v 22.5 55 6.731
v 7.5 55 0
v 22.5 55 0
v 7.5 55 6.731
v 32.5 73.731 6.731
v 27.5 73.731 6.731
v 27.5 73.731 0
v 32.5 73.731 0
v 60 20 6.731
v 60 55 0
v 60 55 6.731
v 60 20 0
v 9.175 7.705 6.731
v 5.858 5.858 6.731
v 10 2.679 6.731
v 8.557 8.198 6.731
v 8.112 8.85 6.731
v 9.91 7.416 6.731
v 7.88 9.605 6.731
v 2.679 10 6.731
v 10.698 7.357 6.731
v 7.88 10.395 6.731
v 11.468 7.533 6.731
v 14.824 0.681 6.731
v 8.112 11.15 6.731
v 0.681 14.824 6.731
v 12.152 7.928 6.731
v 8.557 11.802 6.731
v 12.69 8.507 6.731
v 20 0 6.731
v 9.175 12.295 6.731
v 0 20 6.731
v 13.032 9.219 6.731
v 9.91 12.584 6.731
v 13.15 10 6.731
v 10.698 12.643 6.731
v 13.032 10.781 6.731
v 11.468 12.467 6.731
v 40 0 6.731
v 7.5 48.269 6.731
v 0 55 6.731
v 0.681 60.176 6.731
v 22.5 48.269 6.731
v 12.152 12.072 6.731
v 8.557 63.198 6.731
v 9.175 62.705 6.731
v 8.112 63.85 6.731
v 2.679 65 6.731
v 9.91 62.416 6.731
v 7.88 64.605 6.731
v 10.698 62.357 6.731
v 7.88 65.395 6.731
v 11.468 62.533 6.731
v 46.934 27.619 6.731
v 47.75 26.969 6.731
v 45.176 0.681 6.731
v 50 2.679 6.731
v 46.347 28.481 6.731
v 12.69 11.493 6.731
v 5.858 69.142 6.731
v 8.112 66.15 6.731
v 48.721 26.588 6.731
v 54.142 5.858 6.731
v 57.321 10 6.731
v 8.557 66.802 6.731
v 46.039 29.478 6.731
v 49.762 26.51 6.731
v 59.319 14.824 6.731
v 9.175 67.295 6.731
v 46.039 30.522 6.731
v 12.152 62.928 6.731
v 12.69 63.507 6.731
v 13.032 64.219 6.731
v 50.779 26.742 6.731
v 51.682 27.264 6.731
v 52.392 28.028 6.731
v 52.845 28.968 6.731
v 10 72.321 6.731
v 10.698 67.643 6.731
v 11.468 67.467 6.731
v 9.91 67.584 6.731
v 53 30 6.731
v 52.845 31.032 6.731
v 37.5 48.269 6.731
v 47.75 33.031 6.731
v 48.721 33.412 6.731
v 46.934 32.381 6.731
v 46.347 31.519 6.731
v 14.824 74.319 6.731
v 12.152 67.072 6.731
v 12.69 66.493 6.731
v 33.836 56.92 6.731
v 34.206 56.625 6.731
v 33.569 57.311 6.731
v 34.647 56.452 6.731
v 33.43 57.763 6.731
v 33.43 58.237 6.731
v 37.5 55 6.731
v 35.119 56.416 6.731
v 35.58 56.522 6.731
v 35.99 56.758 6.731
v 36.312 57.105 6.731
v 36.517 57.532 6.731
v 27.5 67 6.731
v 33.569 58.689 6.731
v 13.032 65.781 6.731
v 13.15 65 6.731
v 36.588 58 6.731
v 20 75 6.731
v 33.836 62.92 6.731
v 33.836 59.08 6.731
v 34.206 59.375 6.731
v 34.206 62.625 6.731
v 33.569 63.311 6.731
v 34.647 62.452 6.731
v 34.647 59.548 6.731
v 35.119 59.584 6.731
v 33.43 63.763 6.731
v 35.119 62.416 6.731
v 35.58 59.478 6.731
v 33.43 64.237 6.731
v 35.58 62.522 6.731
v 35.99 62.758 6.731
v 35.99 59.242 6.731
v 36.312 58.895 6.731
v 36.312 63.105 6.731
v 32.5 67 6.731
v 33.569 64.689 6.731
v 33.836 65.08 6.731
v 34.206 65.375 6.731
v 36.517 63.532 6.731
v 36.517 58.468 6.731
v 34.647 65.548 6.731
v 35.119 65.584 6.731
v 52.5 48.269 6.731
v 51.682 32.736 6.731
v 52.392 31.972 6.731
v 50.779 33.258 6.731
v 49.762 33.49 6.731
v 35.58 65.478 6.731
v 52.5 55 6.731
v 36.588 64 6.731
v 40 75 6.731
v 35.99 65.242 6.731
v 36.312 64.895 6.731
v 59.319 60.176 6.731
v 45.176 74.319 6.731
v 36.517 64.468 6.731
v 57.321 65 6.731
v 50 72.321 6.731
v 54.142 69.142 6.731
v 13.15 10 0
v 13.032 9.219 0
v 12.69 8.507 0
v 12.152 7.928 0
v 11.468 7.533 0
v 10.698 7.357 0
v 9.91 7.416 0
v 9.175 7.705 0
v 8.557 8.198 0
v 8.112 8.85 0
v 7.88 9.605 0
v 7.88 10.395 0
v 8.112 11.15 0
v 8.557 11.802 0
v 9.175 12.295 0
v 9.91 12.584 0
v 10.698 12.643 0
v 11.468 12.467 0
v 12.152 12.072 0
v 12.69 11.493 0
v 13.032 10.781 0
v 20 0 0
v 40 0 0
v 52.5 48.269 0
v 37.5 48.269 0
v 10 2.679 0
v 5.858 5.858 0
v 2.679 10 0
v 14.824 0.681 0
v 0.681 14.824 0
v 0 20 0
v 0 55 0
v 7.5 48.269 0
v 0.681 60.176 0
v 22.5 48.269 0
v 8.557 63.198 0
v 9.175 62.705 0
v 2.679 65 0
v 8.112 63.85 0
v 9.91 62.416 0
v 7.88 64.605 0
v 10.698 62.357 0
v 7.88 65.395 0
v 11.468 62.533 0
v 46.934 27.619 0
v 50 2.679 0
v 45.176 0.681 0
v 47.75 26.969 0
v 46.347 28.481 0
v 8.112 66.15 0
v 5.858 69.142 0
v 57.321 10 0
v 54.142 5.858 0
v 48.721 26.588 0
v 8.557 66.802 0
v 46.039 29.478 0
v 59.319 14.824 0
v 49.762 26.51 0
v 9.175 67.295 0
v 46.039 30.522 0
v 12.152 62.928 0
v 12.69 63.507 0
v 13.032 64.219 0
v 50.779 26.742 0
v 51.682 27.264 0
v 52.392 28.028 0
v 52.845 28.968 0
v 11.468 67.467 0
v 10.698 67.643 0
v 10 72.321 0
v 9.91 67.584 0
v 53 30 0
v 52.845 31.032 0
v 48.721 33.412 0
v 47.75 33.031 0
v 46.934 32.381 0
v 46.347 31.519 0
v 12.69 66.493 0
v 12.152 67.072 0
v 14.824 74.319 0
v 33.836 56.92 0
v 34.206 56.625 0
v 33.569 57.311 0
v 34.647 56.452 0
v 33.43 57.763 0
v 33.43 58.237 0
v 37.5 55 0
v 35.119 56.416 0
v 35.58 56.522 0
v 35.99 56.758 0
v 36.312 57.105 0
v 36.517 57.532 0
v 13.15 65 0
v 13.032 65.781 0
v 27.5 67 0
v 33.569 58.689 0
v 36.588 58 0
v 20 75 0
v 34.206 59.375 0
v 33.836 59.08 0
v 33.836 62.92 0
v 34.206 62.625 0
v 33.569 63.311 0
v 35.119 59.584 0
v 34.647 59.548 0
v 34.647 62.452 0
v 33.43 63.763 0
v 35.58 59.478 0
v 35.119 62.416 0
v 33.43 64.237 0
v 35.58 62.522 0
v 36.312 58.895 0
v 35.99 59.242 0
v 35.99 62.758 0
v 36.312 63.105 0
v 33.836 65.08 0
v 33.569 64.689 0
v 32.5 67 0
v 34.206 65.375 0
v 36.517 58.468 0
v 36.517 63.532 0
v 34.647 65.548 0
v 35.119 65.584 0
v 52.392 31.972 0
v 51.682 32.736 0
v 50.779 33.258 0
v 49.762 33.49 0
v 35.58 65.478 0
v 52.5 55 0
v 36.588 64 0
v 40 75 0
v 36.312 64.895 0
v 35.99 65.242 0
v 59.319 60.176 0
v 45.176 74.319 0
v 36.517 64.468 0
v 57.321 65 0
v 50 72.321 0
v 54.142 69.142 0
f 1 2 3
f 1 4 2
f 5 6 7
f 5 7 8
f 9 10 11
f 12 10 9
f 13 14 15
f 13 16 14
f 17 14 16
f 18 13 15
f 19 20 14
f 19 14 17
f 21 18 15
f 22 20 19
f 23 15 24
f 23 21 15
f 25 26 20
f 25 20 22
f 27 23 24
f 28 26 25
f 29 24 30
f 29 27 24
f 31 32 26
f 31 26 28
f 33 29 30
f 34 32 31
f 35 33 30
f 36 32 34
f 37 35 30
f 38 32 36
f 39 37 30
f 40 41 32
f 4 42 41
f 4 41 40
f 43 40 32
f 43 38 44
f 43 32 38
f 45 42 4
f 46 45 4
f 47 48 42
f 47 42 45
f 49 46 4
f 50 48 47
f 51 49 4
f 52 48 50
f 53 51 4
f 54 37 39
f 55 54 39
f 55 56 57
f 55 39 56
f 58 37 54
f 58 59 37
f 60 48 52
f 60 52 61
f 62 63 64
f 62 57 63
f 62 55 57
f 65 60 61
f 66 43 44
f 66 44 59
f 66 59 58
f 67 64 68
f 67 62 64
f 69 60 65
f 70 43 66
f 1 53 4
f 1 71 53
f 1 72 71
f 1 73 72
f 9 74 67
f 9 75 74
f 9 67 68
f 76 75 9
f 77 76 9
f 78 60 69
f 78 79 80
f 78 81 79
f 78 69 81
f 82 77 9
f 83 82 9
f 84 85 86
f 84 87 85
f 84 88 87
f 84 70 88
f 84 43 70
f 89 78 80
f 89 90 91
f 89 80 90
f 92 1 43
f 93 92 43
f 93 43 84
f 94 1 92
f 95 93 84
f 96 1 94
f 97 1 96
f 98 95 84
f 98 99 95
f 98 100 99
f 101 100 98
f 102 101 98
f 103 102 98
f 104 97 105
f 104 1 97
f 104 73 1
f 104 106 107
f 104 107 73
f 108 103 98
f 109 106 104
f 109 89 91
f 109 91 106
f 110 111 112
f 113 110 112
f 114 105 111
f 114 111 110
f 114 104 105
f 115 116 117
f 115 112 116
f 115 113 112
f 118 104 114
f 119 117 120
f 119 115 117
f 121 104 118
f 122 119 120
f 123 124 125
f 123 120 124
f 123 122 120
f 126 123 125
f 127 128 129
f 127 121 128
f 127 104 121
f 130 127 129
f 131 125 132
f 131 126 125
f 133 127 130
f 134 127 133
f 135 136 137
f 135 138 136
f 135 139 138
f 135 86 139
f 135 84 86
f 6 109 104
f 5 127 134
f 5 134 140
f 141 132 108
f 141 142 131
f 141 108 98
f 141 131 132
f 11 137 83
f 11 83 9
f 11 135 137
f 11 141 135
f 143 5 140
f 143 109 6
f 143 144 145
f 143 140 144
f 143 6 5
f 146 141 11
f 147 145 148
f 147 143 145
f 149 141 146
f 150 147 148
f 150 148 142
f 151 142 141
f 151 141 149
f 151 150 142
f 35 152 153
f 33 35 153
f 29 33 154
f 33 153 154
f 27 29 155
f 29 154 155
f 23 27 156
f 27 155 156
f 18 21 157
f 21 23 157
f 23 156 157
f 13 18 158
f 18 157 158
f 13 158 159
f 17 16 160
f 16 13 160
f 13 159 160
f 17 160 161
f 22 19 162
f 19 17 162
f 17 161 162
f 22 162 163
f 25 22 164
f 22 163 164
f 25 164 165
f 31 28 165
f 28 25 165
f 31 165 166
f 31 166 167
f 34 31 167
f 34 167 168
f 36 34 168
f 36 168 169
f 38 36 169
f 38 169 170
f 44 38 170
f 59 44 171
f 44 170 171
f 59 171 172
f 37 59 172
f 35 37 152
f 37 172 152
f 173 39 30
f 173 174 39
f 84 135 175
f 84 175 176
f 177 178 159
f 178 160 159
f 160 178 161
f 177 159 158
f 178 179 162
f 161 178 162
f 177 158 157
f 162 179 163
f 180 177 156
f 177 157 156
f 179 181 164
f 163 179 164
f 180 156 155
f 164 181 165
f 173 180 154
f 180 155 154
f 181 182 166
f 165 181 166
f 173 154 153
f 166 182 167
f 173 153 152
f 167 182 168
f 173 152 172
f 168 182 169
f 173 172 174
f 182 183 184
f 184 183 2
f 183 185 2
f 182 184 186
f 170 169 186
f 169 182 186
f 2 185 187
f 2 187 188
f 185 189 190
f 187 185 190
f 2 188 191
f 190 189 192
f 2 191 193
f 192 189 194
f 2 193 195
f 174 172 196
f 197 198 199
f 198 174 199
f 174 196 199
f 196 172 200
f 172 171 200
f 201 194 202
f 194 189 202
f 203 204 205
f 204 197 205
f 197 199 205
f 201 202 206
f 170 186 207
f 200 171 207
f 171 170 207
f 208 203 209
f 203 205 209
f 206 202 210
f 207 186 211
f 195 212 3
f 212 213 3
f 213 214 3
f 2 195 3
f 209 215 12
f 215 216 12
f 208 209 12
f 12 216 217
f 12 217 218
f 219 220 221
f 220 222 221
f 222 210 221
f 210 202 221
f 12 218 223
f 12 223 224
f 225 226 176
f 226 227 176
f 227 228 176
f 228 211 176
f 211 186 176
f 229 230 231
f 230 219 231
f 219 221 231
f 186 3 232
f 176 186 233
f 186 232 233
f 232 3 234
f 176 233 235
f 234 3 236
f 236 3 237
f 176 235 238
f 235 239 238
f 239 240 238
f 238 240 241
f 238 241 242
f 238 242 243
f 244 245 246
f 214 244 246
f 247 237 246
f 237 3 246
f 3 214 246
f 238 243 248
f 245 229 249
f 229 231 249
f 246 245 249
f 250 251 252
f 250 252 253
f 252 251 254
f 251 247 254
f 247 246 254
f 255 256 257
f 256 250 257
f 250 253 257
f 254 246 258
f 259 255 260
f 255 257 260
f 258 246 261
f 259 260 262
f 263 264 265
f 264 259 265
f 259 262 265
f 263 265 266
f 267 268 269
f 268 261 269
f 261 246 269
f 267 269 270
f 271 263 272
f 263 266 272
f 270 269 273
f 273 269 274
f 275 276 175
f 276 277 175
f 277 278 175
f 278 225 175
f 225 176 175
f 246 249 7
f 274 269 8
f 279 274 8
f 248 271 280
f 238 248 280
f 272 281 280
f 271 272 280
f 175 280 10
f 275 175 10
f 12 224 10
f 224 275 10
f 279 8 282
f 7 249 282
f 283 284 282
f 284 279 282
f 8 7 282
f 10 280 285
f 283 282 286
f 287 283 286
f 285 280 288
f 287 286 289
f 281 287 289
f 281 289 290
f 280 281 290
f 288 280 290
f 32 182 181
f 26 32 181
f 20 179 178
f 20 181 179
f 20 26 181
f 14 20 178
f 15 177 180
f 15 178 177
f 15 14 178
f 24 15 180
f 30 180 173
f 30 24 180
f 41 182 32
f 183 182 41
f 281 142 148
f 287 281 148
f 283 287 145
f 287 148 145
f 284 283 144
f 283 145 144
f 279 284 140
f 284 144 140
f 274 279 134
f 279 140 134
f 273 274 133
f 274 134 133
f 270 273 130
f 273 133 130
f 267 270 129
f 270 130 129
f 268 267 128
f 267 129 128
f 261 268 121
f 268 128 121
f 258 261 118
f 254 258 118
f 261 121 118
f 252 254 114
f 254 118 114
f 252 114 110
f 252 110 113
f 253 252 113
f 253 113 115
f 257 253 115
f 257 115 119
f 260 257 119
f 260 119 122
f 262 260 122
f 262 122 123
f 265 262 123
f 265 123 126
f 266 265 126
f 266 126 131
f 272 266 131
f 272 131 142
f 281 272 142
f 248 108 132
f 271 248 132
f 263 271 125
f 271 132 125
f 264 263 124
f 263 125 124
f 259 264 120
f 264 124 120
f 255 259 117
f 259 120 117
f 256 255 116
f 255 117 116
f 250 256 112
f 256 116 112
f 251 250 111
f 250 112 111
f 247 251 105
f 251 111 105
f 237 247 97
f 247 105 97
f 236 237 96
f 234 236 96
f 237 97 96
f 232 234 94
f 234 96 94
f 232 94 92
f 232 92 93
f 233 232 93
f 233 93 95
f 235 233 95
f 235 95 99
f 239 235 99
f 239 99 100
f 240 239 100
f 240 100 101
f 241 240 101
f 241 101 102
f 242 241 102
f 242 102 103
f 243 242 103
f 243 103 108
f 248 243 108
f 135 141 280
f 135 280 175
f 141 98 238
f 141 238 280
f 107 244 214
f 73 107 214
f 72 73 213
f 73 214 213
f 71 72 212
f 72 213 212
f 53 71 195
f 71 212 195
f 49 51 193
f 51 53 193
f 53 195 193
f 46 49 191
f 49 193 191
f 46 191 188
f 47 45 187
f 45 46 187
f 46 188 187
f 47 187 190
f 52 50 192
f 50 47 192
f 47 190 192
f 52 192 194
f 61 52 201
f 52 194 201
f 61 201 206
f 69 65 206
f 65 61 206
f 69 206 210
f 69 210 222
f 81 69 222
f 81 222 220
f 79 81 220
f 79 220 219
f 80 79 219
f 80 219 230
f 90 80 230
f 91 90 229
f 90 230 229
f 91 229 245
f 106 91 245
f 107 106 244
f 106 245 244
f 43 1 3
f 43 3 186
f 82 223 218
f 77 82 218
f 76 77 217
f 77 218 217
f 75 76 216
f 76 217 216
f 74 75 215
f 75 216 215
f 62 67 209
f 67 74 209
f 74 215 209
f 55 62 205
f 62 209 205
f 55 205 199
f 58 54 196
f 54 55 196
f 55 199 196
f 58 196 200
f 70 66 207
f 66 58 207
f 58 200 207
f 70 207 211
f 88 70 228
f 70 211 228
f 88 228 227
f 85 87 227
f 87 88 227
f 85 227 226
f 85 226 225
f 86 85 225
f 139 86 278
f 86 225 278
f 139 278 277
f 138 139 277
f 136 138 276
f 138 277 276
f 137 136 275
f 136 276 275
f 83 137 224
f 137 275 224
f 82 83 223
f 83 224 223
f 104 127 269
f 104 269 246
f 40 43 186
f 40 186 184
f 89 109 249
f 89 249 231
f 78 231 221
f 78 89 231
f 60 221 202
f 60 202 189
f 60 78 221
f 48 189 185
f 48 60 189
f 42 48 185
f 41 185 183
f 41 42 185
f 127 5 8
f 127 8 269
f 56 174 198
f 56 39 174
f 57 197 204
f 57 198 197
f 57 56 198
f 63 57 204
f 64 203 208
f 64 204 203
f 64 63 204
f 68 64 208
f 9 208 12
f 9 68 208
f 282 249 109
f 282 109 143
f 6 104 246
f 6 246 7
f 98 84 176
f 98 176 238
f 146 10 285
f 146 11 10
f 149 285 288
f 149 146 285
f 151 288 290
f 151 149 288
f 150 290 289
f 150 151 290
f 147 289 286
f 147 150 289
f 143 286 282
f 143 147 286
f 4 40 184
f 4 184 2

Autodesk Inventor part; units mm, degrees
ref_plane "YZ Plane" through (0, 0, 0) normal (1, 0, 0) x (0, 1, 0)
ref_plane "XZ Plane" through (0, 0, 0) normal (0, 1, 0) x (-1, 0, 0)
ref_plane "XY Plane" through (0, 0, 0) normal (0, 0, 1) x (1, 0, 0)
sketch "Sketch1" plane through (0, 0, 0) normal (0, 0, 1) x (1, 0, 0)
  circle A0 centre (10.5, 65) radius 2.65
  circle A1 centre (10.5, 10) radius 2.65
  circle A2 centre (49.5, 30) radius 3.5
  line L0 (60, 75) -> (60, 0)
  line L1 (60, 0) -> (0, 0)
  line L2 (0, 0) -> (0, 75)
  line L3 (0, 75) -> (60, 75)
  point P0 (30, 75)
  dimension "d0" = 39
  dimension "d1" = 5.3
  dimension "d2" = 55
  dimension "d3" = 10
  dimension "d5" = 10.5
  dimension "d16" = 10.5
  dimension "d19" = 20
  dimension "d22" = 7
  dimension "d55" = 75
  dimension "d64" = 60
extrude "Extrusion1" add sketch "Sketch1" along normal blind 6.731
sketch "Sketch3" plane through (0, 0, 6.731) normal (0, 0, 1) x (1, 0, 0)
  line L0 (60, 0) -> (60, 75) projected
  line L1 (60, 75) -> (0, 75) projected
  line L2 (0, 75) -> (0, 0) projected
  line L3 (7.5, 55) -> (22.5, 55)
  line L4 (22.5, 55) -> (22.5, 48.269)
  line L5 (22.5, 48.269) -> (7.5, 48.269)
  line L6 (7.5, 48.269) -> (7.5, 55)
  line L7 (37.5, 55) -> (52.5, 55)
  line L8 (52.5, 55) -> (52.5, 48.269)
  line L9 (52.5, 48.269) -> (37.5, 48.269)
  line L10 (37.5, 48.269) -> (37.5, 55)
  line L11 (27.5, 73.731) -> (32.5, 73.731)
  line L12 (32.5, 73.731) -> (32.5, 67)
  line L13 (32.5, 67) -> (27.5, 67)
  line L14 (27.5, 67) -> (27.5, 73.731)
  circle A0 centre (35, 64) radius 1.588
  circle A1 centre (35, 58) radius 1.588
  line L15 (37.5, 55) -> (30, 55) construction
  line L16 (30, 55) -> (22.5, 55) construction
  point P0 (30, 67)
  dimension "d70" = 15
  dimension "d71" = 6.731
  dimension "d73" = 15
  dimension "d74" = 7.5
  dimension "d75" = 7.5
  dimension "d78" = 20
  dimension "d81" = 12
  dimension "d84" = 3.176
  dimension "d91" = 3
  dimension "d92" = 6
  dimension "d93" = 3
  dimension "d94" = 5
  dimension "d95" = 5
extrude "Extrusion3" cut sketch "Sketch3" against normal up to next
fillet "Fillet2" radius 20 2 edges at (60, 0, 3.3655) (0, 0, 3.3655)
fillet "Fillet2" radius 20 2 edges at (0, 75, 3.3655) (60, 75, 3.3655)
equation "\"d16\" = d5"
equation "\"d20\" = THICKB"
equation "\"THICKA\" = 3.175"
equation "\"THICKB\" = 6.731"
equation "\"THICKC\" = 12.7"
equation "\"BALLDIA\" = 12"
equation "\"MAGDIA\" = 9.5"
equation "\"THICKPLY\" = 5"
properties part number "Carriage_Frame"
